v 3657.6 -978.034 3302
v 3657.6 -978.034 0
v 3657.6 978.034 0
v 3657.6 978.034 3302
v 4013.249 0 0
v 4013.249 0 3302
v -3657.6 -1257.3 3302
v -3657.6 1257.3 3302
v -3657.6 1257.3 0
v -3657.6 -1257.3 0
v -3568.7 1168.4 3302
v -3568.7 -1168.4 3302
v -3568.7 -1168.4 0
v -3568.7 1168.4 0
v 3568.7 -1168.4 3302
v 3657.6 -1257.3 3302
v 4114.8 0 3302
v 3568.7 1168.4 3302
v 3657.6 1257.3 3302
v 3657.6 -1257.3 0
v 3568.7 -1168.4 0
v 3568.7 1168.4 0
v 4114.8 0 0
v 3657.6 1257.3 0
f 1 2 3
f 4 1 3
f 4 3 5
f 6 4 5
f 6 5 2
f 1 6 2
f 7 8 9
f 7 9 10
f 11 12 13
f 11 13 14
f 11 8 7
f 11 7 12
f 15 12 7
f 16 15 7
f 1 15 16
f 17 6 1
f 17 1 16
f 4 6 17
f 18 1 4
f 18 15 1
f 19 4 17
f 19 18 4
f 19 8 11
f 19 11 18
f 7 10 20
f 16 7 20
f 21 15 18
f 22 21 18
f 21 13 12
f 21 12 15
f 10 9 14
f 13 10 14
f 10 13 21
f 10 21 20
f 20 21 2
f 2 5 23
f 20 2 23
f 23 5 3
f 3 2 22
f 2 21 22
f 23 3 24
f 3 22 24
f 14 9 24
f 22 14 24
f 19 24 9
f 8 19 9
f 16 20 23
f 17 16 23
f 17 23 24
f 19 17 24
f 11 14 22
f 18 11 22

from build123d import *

# Parameters (mm, degrees)
F0_W     = 7137.4
F0_H     = 2336.8
F1_DEPTH = 3302


with BuildPart() as f1:
    # F0 (on Top) → F1 (new body)
    with BuildSketch(Plane.XY):
        Polygon((3657.6, 1257.3), (-3657.6, 1257.3), (-3657.6, -1257.3), (3657.6, -1257.3), (3657.6, -978.033662), (3657.6, 978.033662), align=None)
        Rectangle(F0_W, F0_H, mode=Mode.SUBTRACT)
        Polygon((4114.8, 0), (3657.6, 1257.3), (3657.6, 978.033662), (4013.248604, 0), (3657.6, -978.033662), (3657.6, -1257.3), align=None)
    extrude(amount=F1_DEPTH)


solid = f1.part
